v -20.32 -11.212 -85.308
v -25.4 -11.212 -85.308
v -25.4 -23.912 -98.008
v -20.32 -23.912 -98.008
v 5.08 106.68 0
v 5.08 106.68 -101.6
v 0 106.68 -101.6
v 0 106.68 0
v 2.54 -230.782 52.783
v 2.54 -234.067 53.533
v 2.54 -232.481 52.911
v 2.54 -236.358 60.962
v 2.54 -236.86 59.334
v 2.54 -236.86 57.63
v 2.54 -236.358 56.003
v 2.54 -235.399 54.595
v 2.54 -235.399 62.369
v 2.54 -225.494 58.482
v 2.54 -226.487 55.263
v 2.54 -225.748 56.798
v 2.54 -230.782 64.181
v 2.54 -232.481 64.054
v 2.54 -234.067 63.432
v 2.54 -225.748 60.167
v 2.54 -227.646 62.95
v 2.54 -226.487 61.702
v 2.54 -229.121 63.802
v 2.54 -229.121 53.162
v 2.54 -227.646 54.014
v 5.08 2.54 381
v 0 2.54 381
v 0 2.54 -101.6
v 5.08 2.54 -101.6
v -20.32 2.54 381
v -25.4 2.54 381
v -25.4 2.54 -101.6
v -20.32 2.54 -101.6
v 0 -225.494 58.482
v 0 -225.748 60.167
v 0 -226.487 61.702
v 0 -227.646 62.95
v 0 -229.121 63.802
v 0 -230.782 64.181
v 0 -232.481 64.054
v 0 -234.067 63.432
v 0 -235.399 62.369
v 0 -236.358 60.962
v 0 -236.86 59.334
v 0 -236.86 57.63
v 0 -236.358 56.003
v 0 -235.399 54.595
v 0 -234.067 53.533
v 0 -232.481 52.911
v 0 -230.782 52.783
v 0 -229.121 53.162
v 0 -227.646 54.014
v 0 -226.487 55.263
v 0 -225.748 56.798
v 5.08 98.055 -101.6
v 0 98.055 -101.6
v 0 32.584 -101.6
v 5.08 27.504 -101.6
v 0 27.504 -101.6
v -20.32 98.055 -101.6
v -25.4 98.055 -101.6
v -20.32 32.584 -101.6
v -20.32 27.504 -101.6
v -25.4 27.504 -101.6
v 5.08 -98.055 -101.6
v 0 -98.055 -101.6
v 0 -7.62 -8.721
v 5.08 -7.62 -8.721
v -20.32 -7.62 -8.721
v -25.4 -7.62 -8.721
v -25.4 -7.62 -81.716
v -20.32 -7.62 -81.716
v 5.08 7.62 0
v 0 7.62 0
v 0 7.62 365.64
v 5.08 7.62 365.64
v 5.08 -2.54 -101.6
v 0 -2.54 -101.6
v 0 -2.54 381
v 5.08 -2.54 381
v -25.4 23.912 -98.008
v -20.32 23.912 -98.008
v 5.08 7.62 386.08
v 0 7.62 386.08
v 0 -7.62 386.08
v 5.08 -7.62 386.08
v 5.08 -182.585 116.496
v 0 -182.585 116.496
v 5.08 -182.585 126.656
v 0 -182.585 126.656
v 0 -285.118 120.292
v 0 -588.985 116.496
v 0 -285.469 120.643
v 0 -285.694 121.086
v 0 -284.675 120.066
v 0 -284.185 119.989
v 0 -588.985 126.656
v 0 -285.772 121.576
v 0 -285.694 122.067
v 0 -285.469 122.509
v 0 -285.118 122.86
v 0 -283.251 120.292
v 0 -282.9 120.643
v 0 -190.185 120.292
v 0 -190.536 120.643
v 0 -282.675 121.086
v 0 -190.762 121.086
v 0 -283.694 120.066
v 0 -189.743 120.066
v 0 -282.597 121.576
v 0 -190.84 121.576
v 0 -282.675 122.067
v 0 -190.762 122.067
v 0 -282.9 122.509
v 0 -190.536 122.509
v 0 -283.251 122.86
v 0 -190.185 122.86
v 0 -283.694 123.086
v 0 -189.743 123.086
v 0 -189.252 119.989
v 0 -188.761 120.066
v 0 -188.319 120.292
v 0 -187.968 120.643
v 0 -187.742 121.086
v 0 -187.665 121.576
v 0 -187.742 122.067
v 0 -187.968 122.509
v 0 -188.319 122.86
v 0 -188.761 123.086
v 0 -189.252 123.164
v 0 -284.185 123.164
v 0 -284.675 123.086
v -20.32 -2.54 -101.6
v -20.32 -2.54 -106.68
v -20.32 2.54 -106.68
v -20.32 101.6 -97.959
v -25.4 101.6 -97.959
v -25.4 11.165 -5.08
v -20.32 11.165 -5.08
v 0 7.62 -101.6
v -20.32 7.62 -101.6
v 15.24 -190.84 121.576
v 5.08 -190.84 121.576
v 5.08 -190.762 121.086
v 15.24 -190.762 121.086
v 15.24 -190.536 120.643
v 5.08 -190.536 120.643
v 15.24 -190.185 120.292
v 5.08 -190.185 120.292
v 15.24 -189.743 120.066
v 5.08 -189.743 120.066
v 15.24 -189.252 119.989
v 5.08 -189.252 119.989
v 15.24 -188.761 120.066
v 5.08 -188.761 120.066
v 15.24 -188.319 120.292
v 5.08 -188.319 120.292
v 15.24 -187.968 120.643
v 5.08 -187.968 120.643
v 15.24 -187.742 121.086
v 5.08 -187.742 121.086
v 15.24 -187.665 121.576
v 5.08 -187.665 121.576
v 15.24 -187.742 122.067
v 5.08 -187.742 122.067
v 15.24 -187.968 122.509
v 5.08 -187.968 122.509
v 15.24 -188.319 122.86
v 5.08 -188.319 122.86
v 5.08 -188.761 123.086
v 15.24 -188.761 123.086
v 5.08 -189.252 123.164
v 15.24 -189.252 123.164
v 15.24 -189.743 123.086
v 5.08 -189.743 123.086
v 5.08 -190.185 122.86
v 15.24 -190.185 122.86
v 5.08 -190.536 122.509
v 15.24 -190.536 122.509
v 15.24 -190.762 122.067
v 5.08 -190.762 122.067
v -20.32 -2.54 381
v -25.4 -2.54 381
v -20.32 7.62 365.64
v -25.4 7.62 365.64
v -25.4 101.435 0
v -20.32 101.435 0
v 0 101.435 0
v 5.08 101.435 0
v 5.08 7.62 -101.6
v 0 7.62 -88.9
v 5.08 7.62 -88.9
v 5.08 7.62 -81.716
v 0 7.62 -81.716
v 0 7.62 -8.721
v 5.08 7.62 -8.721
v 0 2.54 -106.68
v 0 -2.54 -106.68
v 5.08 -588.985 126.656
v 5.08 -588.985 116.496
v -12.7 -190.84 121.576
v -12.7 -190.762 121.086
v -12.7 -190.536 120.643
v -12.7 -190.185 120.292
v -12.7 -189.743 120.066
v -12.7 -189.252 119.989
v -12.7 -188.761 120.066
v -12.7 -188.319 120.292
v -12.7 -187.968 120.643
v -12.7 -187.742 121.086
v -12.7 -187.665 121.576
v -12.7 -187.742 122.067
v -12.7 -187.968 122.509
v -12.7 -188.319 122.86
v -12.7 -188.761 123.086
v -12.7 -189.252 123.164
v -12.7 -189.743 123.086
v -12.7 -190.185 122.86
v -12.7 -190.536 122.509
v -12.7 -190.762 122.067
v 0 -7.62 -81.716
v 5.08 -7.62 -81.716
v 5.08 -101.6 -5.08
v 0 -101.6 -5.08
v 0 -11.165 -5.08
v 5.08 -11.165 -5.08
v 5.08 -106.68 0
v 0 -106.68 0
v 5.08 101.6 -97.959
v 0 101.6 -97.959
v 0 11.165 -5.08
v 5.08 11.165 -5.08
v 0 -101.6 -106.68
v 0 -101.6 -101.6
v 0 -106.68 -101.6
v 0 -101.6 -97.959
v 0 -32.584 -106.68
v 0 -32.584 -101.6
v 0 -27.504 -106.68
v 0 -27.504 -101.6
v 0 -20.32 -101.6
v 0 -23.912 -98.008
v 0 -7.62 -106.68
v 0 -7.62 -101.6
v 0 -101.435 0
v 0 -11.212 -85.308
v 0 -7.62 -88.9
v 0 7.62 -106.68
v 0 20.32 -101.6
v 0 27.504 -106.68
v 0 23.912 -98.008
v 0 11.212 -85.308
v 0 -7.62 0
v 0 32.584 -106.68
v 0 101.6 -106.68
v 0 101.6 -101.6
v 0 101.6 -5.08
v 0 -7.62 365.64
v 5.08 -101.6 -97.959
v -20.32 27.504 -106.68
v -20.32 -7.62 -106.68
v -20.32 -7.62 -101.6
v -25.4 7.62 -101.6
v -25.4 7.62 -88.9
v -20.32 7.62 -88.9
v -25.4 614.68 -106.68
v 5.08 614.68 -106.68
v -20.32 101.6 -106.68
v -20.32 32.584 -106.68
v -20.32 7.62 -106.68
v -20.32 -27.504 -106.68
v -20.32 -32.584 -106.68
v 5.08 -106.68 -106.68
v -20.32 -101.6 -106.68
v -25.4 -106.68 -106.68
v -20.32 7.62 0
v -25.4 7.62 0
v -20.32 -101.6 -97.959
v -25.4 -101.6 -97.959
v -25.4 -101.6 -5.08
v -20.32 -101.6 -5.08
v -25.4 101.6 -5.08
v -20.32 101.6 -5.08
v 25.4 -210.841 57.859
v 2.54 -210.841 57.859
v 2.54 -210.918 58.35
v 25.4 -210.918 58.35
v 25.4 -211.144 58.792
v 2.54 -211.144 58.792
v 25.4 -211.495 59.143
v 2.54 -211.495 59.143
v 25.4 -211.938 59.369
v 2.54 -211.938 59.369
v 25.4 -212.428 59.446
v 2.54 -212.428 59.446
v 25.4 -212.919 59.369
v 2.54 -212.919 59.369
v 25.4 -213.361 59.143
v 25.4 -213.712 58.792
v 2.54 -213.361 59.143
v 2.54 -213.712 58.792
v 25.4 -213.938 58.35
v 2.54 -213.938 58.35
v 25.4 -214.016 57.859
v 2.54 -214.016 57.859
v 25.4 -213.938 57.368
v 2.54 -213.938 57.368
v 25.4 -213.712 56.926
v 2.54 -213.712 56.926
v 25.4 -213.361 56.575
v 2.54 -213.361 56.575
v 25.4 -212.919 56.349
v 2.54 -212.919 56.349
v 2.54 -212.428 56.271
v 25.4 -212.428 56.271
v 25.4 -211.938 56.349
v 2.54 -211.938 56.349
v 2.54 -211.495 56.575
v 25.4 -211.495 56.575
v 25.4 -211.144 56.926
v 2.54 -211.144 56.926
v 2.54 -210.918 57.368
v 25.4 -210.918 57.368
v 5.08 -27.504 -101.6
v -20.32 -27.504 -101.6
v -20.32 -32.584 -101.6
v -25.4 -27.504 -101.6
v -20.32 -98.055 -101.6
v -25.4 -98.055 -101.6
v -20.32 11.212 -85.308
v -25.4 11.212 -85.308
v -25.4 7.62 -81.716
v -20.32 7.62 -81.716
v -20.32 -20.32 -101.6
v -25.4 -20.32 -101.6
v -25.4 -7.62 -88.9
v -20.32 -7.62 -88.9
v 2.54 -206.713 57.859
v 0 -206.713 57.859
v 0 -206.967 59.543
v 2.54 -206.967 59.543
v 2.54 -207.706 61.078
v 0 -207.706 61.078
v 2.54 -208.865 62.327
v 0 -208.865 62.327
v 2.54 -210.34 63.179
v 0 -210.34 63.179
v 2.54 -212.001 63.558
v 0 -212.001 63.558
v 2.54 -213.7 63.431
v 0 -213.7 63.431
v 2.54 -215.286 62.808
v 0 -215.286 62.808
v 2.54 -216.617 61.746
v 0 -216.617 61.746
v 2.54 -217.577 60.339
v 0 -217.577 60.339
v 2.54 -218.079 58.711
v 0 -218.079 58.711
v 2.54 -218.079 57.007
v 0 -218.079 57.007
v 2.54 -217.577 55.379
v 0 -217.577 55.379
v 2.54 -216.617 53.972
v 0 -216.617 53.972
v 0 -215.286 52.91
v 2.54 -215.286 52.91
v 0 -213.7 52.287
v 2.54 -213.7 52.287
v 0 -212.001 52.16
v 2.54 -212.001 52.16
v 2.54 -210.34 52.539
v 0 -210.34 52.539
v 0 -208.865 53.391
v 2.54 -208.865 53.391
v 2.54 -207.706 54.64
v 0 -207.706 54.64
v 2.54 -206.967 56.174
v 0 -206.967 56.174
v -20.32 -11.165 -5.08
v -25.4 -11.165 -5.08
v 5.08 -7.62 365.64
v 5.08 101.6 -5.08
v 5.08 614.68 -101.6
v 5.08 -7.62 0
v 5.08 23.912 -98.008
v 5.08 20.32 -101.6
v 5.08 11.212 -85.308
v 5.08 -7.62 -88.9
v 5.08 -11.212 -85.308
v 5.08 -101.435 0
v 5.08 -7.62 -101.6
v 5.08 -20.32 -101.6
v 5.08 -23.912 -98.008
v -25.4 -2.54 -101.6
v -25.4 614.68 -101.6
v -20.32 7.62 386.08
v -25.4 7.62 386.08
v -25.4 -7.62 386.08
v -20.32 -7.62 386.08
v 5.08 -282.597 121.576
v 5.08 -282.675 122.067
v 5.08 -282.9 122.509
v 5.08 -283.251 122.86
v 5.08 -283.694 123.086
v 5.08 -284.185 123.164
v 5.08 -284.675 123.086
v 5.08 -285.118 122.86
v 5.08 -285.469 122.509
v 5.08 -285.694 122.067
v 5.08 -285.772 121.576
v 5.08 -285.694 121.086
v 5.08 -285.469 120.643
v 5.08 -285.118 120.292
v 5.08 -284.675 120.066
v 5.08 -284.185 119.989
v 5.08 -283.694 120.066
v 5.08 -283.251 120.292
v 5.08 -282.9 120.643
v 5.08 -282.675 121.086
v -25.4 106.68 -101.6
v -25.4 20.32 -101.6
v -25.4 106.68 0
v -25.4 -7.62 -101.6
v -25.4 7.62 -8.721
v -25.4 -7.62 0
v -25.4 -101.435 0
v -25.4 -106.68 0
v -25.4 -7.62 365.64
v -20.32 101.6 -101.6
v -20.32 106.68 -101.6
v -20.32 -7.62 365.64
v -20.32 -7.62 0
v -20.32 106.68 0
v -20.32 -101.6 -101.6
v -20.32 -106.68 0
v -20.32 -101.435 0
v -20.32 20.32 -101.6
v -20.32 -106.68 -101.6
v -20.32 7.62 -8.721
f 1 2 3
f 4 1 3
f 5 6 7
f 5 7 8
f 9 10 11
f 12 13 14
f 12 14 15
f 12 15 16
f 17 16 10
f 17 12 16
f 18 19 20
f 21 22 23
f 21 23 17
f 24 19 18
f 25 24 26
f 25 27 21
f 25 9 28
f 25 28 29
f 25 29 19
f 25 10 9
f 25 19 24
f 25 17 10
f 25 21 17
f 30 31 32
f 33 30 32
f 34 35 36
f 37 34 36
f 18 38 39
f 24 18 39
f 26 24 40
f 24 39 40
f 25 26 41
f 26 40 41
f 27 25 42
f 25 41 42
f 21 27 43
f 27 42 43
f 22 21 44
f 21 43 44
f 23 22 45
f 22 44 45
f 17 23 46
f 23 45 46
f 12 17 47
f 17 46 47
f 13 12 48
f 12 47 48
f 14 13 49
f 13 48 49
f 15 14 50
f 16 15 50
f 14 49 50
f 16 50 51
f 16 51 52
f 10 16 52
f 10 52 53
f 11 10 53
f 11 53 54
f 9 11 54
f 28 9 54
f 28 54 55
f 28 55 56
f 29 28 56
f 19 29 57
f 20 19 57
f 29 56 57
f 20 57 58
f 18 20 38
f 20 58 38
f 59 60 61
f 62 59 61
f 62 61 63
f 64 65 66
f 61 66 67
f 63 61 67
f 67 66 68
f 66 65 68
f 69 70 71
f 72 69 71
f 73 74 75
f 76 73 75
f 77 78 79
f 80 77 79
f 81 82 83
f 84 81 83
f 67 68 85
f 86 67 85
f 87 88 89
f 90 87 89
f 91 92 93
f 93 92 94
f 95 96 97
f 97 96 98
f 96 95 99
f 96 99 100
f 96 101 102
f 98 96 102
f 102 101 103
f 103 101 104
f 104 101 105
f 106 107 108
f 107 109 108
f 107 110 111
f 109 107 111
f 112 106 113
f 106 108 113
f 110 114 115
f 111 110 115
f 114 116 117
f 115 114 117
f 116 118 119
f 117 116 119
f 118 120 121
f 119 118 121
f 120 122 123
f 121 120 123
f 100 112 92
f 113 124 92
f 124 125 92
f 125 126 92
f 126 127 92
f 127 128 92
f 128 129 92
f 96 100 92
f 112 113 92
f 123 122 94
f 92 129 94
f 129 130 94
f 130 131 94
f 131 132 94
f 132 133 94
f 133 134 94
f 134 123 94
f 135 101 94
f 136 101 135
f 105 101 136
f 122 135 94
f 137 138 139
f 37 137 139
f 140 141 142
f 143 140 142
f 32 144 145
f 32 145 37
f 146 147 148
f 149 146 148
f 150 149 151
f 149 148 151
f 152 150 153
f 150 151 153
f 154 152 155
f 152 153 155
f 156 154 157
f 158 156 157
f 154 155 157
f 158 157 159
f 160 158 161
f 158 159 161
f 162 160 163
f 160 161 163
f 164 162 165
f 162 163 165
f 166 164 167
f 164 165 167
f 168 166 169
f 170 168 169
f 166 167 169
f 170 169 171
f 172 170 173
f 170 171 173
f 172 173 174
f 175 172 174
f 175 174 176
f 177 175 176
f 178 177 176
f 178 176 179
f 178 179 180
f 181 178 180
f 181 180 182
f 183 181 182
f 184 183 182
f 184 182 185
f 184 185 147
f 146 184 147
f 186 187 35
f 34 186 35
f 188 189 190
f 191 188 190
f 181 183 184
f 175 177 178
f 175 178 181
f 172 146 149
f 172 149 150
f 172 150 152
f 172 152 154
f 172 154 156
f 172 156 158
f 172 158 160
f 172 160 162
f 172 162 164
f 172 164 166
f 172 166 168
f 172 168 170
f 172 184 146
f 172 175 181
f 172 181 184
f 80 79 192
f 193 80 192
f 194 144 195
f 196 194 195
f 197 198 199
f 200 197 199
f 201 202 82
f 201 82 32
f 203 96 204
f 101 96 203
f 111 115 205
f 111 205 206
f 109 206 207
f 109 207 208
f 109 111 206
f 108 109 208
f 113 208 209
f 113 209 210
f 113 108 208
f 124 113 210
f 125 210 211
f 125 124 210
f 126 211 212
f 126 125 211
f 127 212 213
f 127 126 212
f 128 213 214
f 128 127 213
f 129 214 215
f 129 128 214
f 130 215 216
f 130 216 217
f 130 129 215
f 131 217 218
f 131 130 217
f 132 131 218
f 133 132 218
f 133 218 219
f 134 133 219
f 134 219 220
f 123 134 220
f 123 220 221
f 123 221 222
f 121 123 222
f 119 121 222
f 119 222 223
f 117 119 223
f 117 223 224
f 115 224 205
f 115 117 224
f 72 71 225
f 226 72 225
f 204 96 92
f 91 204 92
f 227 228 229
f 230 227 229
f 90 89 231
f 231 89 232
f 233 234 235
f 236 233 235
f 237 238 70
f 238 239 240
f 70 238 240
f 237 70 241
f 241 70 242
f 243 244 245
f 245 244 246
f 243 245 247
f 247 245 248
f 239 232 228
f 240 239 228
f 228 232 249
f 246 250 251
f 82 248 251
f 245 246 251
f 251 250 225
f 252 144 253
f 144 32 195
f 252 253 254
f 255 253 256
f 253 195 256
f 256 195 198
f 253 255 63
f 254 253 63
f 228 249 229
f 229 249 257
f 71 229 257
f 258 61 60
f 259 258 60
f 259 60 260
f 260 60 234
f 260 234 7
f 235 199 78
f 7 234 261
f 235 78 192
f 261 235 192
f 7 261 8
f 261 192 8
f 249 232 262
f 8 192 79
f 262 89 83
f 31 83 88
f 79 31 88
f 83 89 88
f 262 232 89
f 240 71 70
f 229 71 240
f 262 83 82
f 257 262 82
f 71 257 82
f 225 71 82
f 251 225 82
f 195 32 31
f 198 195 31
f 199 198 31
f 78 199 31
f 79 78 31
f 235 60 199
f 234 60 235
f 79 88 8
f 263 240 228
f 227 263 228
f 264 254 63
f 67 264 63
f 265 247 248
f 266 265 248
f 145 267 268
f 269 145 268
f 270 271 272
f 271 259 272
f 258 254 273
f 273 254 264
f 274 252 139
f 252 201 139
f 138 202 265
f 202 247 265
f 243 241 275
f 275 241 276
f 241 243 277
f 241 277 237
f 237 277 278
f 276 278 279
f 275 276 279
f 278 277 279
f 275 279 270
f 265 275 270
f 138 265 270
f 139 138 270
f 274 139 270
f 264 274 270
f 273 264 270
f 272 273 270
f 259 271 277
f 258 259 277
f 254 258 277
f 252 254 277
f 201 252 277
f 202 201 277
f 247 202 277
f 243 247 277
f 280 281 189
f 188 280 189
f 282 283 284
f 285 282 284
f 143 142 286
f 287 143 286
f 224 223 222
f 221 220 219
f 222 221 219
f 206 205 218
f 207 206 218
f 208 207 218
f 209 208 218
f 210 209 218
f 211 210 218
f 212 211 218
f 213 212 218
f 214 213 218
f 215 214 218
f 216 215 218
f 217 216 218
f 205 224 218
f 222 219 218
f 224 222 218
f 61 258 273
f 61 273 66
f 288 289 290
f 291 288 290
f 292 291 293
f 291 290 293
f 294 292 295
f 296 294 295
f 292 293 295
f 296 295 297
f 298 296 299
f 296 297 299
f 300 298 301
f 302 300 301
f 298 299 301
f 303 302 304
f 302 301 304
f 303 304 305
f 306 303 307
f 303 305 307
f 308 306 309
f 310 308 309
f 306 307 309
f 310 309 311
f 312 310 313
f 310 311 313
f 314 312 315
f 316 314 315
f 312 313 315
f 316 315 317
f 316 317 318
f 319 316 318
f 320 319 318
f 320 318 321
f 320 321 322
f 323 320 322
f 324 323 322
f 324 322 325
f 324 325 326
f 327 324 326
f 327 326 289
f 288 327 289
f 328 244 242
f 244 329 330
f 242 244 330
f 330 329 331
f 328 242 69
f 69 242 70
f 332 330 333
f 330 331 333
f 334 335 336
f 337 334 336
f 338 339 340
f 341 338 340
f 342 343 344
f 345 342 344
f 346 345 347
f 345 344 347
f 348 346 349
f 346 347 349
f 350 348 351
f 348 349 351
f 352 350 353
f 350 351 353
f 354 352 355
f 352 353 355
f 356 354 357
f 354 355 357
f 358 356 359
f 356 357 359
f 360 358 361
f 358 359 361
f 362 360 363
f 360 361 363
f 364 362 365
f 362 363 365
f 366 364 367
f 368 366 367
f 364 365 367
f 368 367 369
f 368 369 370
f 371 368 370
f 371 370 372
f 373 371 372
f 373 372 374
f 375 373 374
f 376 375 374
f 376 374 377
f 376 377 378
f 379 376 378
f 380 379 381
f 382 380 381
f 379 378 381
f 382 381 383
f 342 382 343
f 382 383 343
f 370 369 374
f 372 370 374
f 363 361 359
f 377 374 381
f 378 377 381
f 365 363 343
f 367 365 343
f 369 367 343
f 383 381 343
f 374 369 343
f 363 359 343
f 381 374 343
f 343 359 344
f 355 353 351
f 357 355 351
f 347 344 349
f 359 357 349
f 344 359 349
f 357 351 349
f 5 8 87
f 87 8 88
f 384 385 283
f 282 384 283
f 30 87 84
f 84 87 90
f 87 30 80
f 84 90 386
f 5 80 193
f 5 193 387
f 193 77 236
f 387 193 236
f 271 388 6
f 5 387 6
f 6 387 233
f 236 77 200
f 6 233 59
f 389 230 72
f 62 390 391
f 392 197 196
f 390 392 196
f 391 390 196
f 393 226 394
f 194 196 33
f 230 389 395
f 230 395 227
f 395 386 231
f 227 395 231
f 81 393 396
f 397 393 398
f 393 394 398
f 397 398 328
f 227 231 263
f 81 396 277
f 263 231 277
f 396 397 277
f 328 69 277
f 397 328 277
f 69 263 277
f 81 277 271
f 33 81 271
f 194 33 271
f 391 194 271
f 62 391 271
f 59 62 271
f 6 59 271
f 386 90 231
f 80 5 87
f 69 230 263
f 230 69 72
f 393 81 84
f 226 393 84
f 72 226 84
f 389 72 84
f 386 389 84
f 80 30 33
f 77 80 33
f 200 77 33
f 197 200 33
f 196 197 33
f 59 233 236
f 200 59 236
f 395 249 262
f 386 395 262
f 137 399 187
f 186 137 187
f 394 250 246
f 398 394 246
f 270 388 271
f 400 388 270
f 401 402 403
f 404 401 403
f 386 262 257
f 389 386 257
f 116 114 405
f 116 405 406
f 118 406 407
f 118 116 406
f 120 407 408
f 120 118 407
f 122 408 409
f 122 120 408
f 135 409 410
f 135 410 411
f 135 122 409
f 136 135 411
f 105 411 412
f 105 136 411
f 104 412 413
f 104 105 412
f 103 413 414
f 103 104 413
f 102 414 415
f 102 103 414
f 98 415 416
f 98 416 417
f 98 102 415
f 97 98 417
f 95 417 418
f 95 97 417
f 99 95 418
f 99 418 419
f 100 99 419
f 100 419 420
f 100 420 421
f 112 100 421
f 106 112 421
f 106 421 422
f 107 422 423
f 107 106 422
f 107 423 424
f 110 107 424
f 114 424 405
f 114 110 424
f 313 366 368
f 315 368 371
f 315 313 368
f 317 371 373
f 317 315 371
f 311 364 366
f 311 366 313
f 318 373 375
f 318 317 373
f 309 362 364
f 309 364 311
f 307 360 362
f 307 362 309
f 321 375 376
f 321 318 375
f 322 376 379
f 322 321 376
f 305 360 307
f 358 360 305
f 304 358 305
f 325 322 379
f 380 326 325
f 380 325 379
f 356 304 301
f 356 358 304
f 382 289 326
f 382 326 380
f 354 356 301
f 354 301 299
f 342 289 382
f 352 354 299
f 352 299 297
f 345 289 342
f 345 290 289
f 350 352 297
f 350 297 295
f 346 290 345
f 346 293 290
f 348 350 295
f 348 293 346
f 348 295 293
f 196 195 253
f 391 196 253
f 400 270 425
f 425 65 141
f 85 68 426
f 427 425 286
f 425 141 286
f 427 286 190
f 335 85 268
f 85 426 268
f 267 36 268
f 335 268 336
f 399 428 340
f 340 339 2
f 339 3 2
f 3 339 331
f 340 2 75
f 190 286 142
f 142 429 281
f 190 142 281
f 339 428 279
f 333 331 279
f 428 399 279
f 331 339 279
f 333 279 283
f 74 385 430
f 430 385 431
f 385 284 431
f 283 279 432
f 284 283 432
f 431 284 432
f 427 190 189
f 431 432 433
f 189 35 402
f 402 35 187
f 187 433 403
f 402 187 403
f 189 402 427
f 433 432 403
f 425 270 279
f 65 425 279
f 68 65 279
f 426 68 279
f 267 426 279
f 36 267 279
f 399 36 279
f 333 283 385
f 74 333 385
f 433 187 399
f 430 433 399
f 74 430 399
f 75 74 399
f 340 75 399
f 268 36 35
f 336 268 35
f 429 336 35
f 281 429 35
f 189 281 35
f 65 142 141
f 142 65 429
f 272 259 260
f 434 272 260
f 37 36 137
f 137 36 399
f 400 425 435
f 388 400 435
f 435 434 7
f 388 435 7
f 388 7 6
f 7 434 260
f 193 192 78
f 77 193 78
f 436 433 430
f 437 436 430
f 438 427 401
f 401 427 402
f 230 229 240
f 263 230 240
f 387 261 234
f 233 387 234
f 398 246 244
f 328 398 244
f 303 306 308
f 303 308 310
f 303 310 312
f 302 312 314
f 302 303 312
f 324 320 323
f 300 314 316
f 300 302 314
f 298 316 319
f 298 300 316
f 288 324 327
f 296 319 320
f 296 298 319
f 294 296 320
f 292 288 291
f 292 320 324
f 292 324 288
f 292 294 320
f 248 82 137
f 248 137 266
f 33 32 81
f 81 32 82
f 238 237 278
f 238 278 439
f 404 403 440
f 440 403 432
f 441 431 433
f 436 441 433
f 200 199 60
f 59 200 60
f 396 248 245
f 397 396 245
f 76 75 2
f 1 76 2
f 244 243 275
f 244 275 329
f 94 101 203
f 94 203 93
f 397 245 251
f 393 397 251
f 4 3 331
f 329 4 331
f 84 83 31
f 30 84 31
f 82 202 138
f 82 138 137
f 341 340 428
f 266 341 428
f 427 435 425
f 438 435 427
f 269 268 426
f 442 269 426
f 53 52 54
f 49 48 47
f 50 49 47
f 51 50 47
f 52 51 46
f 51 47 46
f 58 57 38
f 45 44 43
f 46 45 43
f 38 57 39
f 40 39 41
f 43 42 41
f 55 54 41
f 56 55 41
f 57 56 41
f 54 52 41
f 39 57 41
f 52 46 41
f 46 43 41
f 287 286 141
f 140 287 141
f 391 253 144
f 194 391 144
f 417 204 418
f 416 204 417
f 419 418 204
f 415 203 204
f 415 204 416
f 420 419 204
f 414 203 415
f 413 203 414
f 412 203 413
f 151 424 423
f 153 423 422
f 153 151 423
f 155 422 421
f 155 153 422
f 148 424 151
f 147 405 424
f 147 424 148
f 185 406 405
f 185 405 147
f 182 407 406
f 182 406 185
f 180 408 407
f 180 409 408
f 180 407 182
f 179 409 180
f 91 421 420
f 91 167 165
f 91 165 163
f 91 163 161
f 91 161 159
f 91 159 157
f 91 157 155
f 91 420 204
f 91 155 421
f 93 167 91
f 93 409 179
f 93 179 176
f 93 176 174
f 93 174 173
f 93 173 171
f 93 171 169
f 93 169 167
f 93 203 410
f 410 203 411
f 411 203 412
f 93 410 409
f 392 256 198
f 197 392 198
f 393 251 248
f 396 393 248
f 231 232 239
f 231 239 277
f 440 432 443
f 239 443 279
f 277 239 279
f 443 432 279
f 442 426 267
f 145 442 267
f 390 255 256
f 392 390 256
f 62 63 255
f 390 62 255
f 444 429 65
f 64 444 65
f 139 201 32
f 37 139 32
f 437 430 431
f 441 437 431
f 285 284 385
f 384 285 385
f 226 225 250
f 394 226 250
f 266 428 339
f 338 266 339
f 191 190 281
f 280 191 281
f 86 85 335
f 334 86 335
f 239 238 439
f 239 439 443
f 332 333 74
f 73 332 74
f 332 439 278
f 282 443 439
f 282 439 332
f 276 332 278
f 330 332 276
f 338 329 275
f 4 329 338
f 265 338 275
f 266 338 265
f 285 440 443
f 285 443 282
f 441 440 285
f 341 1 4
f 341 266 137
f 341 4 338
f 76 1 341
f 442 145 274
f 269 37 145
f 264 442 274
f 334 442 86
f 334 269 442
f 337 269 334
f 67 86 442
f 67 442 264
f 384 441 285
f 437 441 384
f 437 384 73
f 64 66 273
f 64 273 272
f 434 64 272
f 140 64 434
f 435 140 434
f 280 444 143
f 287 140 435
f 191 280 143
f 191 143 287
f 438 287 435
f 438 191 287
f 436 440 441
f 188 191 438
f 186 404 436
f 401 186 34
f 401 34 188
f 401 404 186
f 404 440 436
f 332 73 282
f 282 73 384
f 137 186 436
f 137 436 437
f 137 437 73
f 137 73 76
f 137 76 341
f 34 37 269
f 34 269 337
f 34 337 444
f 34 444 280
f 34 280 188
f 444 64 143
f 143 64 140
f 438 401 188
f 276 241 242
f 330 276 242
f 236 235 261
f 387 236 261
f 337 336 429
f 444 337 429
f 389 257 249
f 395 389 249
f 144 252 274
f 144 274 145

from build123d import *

# Parameters (mm, degrees)
F0_W      = 5.08
F0_H      = 5.08
F1_DEPTH  = 5.08
F4_W      = 5.08
F4_H      = 5.08
F5_DEPTH  = 20.32
F6_W      = 406.4
F6_H      = 10.16
F6_R      = 1.5875
F7_DEPTH  = 5.08
F8_R      = 5.715
F8_R_2    = 1.5875
F9_DEPTH  = 2.54
F10_DEPTH = 25.4
F11_R     = 5.715
F12_DEPTH = 2.54
F15_DEPTH = 15.24
F16_DEPTH = 12.7
F18_DEPTH = 508


# Not quite as in the source:
# - the program builds the solid bodies; features that only make, move or delete a surface that nothing else refers to are left out


with BuildPart() as f1:
    # F0 (on Right) → F1 (new body)
    with BuildSketch(Plane.YZ):
        Polygon((2.54, -101.6), (0, -101.6), (-2.54, -101.6), (-7.62, -101.6), (-20.32, -101.6), (-27.5042048969, -101.6), (-98.0548469748, -101.6), (-101.6, -101.6), (-101.6, -97.9590320281), (-101.6, -5.08), (-101.6, 0), (-106.68, 0), (-106.68, -106.68), (0, -106.68), (106.68, -106.68), (106.68, 0), (101.6, 0), (101.6, -5.08), (101.6, -97.9590320281), (101.6, -101.6), (98.0548469748, -101.6), (27.5042048969, -101.6), (20.32, -101.6), (7.62, -101.6), align=None)
        Polygon((101.4354498343, 0), (7.62, 0), (7.62, -5.08), (11.1651530252, -5.08), (101.6, -5.08), (101.6, 0), align=None)
        Polygon((-7.62, -5.08), (-7.62, 0), (-101.4354498343, 0), (-101.6, 0), (-101.6, -5.08), (-11.1651530252, -5.08), align=None)
        Polygon((2.54, 381), (2.54, 0), (7.62, 0), (7.62, 365.6397019183), (7.62, 381), align=None)
        Polygon((-7.62, 0), (-2.54, 0), (-2.54, 381), (-7.62, 381), (-7.62, 365.6397019183), align=None)
        Polygon((-2.54, 381), (2.54, 381), (7.62, 381), (7.62, 386.08), (-7.62, 386.08), (-7.62, 381), align=None)
        Polygon((-2.54, -101.6), (-2.54, -5.08), (-7.62, -5.08), (-7.62, -8.7209679719), (-7.62, -81.7157951031), (-7.62, -88.9), (-7.62, -101.6), align=None)
        Polygon((-7.62, -8.7209679719), (-7.62, -5.08), (-11.1651530252, -5.08), (-101.6, -97.9590320281), (-101.6, -101.6), (-98.0548469748, -101.6), align=None)
        with Locations((5.08, -2.54)):
            Rectangle(F0_W, F0_H)
        with Locations((-5.08, -2.54)):
            Rectangle(F0_W, F0_H)
        Polygon((7.62, -5.08), (2.54, -5.08), (2.54, -101.6), (7.62, -101.6), (7.62, -88.9), (7.62, -81.7157951031), (7.62, -8.7209679719), align=None)
        Polygon((11.1651530252, -5.08), (7.62, -5.08), (7.62, -8.7209679719), (98.0548469748, -101.6), (101.6, -101.6), (101.6, -97.9590320281), align=None)
        Polygon((11.2121024484, -85.3078975516), (7.62, -81.7157951031), (7.62, -88.9), (20.32, -101.6), (27.5042048969, -101.6), (23.9121024484, -98.0078975516), align=None)
        Polygon((-27.5042048969, -101.6), (-20.32, -101.6), (-7.62, -88.9), (-7.62, -81.7157951031), (-11.2121024484, -85.3078975516), (-23.9121024484, -98.0078975516), align=None)
        Polygon((7.62, 365.6397019183), (101.4354498343, 0), (101.6, 0), (106.68, 0), (7.62, 386.08), (7.62, 381), align=None)
        Polygon((-101.6, 0), (-101.4354498343, 0), (-7.62, 365.6397019183), (-7.62, 381), (-7.62, 386.08), (-106.68, 0), align=None)
    extrude(amount=F1_DEPTH)


with BuildPart() as f2_1:
    # F2: copy of F1
    add(f1.part)


with BuildPart() as f2_1_1:
    # F3: moved
    add(f2_1.part.moved(Location((-25.4, 0, 0))))


with BuildPart() as f1_1:
    add(f1.part)

    add(f2_1_1.part)  # F5 merges F2_1
    # F4 (on face) → F5 (join, through all)
    with BuildSketch(Plane(origin=(0, 0, 0), x_dir=(0, -1, 0), z_dir=(-1, 0, 0))):
        with Locations((-104.14, -104.14)):
            Rectangle(F4_W, F4_H)
        with Locations((-30.0442048969, -104.14)):
            Rectangle(F4_W, F4_H)
        with Locations((-5.08, -104.14)):
            Rectangle(F4_W, F4_H)
        with Locations((5.08, -104.14)):
            Rectangle(F4_W, F4_H)
        with Locations((30.0442048969, -104.14)):
            Rectangle(F4_W, F4_H)
        with Locations((104.14, -104.14)):
            Rectangle(F4_W, F4_H)
    extrude(amount=F5_DEPTH)

    # F17 (on face) → F18 (join)
    with BuildSketch(Plane(origin=(0, 106.68, 0), x_dir=(-1, 0, 0), z_dir=(0, 1, 0))):
        Polygon((0, -101.6), (-5.08, -101.6), (-5.08, -106.68), (25.4, -106.68), (25.4, -101.6), (20.32, -101.6), align=None)
    extrude(amount=F18_DEPTH)


with BuildPart() as f7:
    # F6 (on Right) → F7 (new body)
    with BuildSketch(Plane.YZ):
        with Locations((-385.7845490456, 121.5760712194)):
            Rectangle(F6_W, F6_H)
        with Locations((-284.1845490456, 121.5760712194)):
            Circle(F6_R, mode=Mode.SUBTRACT)
        with BuildLine():
            ThreePointArc((-190.8395490456, 121.5760712194), (-189.2520490456, 123.1635712194), (-187.6645490456, 121.5760712194))
            ThreePointArc((-187.6645490456, 121.5760712194), (-189.2520490456, 119.9885712194), (-190.8395490456, 121.5760712194))
        make_face(mode=Mode.SUBTRACT)
        with BuildLine():
            ThreePointArc((-190.8395490456, 121.5760712194), (-189.2520490456, 119.9885712194), (-187.6645490456, 121.5760712194))
            Line((-187.6645490456, 121.5760712194), (-190.8395490456, 121.5760712194))
        make_face()
        with BuildLine():
            Line((-190.8395490456, 121.5760712194), (-187.6645490456, 121.5760712194))
            ThreePointArc((-187.6645490456, 121.5760712194), (-189.2520490456, 123.1635712194), (-190.8395490456, 121.5760712194))
        make_face()
    extrude(amount=F7_DEPTH)

    # F6 (on Right) → F15 (join)
    with BuildSketch(Plane.YZ):
        with BuildLine():
            Line((-190.8395490456, 121.5760712194), (-187.6645490456, 121.5760712194))
            ThreePointArc((-187.6645490456, 121.5760712194), (-189.2520490456, 123.1635712194), (-190.8395490456, 121.5760712194))
        make_face()
        with BuildLine():
            ThreePointArc((-190.8395490456, 121.5760712194), (-189.2520490456, 119.9885712194), (-187.6645490456, 121.5760712194))
            Line((-187.6645490456, 121.5760712194), (-190.8395490456, 121.5760712194))
        make_face()
    extrude(amount=F15_DEPTH)

    # F6 (on Right) → F16 (join)
    with BuildSketch(Plane.YZ):
        with BuildLine():
            Line((-190.8395490456, 121.5760712194), (-187.6645490456, 121.5760712194))
            ThreePointArc((-187.6645490456, 121.5760712194), (-189.2520490456, 123.1635712194), (-190.8395490456, 121.5760712194))
        make_face()
        with BuildLine():
            ThreePointArc((-190.8395490456, 121.5760712194), (-189.2520490456, 119.9885712194), (-187.6645490456, 121.5760712194))
            Line((-187.6645490456, 121.5760712194), (-190.8395490456, 121.5760712194))
        make_face()
    extrude(amount=-F16_DEPTH)


with BuildPart() as f9:
    # F8 (on Right) → F9 (new body)
    with BuildSketch(Plane.YZ):
        with Locations((-212.4280929565, 57.8589513898)):
            Circle(F8_R)
        with Locations((-212.4280929565, 57.8589513898)):
            Circle(F8_R_2, mode=Mode.SUBTRACT)
        with Locations((-212.4280929565, 57.8589513898)):
            Circle(F8_R_2)
    extrude(amount=F9_DEPTH)

    # F8 (on Right) → F10 (join)
    with BuildSketch(Plane.YZ):
        with Locations((-212.4280929565, 57.8589513898)):
            Circle(F8_R_2)
    extrude(amount=F10_DEPTH)


with BuildPart() as f12:
    # F11 (on Right) → F12 (new body)
    with BuildSketch(Plane.YZ):
        with Locations((-231.2091737986, 58.4822148085)):
            Circle(F11_R)
    extrude(amount=F12_DEPTH)


solid = Compound([f1_1.part, f7.part, f9.part, f12.part])
